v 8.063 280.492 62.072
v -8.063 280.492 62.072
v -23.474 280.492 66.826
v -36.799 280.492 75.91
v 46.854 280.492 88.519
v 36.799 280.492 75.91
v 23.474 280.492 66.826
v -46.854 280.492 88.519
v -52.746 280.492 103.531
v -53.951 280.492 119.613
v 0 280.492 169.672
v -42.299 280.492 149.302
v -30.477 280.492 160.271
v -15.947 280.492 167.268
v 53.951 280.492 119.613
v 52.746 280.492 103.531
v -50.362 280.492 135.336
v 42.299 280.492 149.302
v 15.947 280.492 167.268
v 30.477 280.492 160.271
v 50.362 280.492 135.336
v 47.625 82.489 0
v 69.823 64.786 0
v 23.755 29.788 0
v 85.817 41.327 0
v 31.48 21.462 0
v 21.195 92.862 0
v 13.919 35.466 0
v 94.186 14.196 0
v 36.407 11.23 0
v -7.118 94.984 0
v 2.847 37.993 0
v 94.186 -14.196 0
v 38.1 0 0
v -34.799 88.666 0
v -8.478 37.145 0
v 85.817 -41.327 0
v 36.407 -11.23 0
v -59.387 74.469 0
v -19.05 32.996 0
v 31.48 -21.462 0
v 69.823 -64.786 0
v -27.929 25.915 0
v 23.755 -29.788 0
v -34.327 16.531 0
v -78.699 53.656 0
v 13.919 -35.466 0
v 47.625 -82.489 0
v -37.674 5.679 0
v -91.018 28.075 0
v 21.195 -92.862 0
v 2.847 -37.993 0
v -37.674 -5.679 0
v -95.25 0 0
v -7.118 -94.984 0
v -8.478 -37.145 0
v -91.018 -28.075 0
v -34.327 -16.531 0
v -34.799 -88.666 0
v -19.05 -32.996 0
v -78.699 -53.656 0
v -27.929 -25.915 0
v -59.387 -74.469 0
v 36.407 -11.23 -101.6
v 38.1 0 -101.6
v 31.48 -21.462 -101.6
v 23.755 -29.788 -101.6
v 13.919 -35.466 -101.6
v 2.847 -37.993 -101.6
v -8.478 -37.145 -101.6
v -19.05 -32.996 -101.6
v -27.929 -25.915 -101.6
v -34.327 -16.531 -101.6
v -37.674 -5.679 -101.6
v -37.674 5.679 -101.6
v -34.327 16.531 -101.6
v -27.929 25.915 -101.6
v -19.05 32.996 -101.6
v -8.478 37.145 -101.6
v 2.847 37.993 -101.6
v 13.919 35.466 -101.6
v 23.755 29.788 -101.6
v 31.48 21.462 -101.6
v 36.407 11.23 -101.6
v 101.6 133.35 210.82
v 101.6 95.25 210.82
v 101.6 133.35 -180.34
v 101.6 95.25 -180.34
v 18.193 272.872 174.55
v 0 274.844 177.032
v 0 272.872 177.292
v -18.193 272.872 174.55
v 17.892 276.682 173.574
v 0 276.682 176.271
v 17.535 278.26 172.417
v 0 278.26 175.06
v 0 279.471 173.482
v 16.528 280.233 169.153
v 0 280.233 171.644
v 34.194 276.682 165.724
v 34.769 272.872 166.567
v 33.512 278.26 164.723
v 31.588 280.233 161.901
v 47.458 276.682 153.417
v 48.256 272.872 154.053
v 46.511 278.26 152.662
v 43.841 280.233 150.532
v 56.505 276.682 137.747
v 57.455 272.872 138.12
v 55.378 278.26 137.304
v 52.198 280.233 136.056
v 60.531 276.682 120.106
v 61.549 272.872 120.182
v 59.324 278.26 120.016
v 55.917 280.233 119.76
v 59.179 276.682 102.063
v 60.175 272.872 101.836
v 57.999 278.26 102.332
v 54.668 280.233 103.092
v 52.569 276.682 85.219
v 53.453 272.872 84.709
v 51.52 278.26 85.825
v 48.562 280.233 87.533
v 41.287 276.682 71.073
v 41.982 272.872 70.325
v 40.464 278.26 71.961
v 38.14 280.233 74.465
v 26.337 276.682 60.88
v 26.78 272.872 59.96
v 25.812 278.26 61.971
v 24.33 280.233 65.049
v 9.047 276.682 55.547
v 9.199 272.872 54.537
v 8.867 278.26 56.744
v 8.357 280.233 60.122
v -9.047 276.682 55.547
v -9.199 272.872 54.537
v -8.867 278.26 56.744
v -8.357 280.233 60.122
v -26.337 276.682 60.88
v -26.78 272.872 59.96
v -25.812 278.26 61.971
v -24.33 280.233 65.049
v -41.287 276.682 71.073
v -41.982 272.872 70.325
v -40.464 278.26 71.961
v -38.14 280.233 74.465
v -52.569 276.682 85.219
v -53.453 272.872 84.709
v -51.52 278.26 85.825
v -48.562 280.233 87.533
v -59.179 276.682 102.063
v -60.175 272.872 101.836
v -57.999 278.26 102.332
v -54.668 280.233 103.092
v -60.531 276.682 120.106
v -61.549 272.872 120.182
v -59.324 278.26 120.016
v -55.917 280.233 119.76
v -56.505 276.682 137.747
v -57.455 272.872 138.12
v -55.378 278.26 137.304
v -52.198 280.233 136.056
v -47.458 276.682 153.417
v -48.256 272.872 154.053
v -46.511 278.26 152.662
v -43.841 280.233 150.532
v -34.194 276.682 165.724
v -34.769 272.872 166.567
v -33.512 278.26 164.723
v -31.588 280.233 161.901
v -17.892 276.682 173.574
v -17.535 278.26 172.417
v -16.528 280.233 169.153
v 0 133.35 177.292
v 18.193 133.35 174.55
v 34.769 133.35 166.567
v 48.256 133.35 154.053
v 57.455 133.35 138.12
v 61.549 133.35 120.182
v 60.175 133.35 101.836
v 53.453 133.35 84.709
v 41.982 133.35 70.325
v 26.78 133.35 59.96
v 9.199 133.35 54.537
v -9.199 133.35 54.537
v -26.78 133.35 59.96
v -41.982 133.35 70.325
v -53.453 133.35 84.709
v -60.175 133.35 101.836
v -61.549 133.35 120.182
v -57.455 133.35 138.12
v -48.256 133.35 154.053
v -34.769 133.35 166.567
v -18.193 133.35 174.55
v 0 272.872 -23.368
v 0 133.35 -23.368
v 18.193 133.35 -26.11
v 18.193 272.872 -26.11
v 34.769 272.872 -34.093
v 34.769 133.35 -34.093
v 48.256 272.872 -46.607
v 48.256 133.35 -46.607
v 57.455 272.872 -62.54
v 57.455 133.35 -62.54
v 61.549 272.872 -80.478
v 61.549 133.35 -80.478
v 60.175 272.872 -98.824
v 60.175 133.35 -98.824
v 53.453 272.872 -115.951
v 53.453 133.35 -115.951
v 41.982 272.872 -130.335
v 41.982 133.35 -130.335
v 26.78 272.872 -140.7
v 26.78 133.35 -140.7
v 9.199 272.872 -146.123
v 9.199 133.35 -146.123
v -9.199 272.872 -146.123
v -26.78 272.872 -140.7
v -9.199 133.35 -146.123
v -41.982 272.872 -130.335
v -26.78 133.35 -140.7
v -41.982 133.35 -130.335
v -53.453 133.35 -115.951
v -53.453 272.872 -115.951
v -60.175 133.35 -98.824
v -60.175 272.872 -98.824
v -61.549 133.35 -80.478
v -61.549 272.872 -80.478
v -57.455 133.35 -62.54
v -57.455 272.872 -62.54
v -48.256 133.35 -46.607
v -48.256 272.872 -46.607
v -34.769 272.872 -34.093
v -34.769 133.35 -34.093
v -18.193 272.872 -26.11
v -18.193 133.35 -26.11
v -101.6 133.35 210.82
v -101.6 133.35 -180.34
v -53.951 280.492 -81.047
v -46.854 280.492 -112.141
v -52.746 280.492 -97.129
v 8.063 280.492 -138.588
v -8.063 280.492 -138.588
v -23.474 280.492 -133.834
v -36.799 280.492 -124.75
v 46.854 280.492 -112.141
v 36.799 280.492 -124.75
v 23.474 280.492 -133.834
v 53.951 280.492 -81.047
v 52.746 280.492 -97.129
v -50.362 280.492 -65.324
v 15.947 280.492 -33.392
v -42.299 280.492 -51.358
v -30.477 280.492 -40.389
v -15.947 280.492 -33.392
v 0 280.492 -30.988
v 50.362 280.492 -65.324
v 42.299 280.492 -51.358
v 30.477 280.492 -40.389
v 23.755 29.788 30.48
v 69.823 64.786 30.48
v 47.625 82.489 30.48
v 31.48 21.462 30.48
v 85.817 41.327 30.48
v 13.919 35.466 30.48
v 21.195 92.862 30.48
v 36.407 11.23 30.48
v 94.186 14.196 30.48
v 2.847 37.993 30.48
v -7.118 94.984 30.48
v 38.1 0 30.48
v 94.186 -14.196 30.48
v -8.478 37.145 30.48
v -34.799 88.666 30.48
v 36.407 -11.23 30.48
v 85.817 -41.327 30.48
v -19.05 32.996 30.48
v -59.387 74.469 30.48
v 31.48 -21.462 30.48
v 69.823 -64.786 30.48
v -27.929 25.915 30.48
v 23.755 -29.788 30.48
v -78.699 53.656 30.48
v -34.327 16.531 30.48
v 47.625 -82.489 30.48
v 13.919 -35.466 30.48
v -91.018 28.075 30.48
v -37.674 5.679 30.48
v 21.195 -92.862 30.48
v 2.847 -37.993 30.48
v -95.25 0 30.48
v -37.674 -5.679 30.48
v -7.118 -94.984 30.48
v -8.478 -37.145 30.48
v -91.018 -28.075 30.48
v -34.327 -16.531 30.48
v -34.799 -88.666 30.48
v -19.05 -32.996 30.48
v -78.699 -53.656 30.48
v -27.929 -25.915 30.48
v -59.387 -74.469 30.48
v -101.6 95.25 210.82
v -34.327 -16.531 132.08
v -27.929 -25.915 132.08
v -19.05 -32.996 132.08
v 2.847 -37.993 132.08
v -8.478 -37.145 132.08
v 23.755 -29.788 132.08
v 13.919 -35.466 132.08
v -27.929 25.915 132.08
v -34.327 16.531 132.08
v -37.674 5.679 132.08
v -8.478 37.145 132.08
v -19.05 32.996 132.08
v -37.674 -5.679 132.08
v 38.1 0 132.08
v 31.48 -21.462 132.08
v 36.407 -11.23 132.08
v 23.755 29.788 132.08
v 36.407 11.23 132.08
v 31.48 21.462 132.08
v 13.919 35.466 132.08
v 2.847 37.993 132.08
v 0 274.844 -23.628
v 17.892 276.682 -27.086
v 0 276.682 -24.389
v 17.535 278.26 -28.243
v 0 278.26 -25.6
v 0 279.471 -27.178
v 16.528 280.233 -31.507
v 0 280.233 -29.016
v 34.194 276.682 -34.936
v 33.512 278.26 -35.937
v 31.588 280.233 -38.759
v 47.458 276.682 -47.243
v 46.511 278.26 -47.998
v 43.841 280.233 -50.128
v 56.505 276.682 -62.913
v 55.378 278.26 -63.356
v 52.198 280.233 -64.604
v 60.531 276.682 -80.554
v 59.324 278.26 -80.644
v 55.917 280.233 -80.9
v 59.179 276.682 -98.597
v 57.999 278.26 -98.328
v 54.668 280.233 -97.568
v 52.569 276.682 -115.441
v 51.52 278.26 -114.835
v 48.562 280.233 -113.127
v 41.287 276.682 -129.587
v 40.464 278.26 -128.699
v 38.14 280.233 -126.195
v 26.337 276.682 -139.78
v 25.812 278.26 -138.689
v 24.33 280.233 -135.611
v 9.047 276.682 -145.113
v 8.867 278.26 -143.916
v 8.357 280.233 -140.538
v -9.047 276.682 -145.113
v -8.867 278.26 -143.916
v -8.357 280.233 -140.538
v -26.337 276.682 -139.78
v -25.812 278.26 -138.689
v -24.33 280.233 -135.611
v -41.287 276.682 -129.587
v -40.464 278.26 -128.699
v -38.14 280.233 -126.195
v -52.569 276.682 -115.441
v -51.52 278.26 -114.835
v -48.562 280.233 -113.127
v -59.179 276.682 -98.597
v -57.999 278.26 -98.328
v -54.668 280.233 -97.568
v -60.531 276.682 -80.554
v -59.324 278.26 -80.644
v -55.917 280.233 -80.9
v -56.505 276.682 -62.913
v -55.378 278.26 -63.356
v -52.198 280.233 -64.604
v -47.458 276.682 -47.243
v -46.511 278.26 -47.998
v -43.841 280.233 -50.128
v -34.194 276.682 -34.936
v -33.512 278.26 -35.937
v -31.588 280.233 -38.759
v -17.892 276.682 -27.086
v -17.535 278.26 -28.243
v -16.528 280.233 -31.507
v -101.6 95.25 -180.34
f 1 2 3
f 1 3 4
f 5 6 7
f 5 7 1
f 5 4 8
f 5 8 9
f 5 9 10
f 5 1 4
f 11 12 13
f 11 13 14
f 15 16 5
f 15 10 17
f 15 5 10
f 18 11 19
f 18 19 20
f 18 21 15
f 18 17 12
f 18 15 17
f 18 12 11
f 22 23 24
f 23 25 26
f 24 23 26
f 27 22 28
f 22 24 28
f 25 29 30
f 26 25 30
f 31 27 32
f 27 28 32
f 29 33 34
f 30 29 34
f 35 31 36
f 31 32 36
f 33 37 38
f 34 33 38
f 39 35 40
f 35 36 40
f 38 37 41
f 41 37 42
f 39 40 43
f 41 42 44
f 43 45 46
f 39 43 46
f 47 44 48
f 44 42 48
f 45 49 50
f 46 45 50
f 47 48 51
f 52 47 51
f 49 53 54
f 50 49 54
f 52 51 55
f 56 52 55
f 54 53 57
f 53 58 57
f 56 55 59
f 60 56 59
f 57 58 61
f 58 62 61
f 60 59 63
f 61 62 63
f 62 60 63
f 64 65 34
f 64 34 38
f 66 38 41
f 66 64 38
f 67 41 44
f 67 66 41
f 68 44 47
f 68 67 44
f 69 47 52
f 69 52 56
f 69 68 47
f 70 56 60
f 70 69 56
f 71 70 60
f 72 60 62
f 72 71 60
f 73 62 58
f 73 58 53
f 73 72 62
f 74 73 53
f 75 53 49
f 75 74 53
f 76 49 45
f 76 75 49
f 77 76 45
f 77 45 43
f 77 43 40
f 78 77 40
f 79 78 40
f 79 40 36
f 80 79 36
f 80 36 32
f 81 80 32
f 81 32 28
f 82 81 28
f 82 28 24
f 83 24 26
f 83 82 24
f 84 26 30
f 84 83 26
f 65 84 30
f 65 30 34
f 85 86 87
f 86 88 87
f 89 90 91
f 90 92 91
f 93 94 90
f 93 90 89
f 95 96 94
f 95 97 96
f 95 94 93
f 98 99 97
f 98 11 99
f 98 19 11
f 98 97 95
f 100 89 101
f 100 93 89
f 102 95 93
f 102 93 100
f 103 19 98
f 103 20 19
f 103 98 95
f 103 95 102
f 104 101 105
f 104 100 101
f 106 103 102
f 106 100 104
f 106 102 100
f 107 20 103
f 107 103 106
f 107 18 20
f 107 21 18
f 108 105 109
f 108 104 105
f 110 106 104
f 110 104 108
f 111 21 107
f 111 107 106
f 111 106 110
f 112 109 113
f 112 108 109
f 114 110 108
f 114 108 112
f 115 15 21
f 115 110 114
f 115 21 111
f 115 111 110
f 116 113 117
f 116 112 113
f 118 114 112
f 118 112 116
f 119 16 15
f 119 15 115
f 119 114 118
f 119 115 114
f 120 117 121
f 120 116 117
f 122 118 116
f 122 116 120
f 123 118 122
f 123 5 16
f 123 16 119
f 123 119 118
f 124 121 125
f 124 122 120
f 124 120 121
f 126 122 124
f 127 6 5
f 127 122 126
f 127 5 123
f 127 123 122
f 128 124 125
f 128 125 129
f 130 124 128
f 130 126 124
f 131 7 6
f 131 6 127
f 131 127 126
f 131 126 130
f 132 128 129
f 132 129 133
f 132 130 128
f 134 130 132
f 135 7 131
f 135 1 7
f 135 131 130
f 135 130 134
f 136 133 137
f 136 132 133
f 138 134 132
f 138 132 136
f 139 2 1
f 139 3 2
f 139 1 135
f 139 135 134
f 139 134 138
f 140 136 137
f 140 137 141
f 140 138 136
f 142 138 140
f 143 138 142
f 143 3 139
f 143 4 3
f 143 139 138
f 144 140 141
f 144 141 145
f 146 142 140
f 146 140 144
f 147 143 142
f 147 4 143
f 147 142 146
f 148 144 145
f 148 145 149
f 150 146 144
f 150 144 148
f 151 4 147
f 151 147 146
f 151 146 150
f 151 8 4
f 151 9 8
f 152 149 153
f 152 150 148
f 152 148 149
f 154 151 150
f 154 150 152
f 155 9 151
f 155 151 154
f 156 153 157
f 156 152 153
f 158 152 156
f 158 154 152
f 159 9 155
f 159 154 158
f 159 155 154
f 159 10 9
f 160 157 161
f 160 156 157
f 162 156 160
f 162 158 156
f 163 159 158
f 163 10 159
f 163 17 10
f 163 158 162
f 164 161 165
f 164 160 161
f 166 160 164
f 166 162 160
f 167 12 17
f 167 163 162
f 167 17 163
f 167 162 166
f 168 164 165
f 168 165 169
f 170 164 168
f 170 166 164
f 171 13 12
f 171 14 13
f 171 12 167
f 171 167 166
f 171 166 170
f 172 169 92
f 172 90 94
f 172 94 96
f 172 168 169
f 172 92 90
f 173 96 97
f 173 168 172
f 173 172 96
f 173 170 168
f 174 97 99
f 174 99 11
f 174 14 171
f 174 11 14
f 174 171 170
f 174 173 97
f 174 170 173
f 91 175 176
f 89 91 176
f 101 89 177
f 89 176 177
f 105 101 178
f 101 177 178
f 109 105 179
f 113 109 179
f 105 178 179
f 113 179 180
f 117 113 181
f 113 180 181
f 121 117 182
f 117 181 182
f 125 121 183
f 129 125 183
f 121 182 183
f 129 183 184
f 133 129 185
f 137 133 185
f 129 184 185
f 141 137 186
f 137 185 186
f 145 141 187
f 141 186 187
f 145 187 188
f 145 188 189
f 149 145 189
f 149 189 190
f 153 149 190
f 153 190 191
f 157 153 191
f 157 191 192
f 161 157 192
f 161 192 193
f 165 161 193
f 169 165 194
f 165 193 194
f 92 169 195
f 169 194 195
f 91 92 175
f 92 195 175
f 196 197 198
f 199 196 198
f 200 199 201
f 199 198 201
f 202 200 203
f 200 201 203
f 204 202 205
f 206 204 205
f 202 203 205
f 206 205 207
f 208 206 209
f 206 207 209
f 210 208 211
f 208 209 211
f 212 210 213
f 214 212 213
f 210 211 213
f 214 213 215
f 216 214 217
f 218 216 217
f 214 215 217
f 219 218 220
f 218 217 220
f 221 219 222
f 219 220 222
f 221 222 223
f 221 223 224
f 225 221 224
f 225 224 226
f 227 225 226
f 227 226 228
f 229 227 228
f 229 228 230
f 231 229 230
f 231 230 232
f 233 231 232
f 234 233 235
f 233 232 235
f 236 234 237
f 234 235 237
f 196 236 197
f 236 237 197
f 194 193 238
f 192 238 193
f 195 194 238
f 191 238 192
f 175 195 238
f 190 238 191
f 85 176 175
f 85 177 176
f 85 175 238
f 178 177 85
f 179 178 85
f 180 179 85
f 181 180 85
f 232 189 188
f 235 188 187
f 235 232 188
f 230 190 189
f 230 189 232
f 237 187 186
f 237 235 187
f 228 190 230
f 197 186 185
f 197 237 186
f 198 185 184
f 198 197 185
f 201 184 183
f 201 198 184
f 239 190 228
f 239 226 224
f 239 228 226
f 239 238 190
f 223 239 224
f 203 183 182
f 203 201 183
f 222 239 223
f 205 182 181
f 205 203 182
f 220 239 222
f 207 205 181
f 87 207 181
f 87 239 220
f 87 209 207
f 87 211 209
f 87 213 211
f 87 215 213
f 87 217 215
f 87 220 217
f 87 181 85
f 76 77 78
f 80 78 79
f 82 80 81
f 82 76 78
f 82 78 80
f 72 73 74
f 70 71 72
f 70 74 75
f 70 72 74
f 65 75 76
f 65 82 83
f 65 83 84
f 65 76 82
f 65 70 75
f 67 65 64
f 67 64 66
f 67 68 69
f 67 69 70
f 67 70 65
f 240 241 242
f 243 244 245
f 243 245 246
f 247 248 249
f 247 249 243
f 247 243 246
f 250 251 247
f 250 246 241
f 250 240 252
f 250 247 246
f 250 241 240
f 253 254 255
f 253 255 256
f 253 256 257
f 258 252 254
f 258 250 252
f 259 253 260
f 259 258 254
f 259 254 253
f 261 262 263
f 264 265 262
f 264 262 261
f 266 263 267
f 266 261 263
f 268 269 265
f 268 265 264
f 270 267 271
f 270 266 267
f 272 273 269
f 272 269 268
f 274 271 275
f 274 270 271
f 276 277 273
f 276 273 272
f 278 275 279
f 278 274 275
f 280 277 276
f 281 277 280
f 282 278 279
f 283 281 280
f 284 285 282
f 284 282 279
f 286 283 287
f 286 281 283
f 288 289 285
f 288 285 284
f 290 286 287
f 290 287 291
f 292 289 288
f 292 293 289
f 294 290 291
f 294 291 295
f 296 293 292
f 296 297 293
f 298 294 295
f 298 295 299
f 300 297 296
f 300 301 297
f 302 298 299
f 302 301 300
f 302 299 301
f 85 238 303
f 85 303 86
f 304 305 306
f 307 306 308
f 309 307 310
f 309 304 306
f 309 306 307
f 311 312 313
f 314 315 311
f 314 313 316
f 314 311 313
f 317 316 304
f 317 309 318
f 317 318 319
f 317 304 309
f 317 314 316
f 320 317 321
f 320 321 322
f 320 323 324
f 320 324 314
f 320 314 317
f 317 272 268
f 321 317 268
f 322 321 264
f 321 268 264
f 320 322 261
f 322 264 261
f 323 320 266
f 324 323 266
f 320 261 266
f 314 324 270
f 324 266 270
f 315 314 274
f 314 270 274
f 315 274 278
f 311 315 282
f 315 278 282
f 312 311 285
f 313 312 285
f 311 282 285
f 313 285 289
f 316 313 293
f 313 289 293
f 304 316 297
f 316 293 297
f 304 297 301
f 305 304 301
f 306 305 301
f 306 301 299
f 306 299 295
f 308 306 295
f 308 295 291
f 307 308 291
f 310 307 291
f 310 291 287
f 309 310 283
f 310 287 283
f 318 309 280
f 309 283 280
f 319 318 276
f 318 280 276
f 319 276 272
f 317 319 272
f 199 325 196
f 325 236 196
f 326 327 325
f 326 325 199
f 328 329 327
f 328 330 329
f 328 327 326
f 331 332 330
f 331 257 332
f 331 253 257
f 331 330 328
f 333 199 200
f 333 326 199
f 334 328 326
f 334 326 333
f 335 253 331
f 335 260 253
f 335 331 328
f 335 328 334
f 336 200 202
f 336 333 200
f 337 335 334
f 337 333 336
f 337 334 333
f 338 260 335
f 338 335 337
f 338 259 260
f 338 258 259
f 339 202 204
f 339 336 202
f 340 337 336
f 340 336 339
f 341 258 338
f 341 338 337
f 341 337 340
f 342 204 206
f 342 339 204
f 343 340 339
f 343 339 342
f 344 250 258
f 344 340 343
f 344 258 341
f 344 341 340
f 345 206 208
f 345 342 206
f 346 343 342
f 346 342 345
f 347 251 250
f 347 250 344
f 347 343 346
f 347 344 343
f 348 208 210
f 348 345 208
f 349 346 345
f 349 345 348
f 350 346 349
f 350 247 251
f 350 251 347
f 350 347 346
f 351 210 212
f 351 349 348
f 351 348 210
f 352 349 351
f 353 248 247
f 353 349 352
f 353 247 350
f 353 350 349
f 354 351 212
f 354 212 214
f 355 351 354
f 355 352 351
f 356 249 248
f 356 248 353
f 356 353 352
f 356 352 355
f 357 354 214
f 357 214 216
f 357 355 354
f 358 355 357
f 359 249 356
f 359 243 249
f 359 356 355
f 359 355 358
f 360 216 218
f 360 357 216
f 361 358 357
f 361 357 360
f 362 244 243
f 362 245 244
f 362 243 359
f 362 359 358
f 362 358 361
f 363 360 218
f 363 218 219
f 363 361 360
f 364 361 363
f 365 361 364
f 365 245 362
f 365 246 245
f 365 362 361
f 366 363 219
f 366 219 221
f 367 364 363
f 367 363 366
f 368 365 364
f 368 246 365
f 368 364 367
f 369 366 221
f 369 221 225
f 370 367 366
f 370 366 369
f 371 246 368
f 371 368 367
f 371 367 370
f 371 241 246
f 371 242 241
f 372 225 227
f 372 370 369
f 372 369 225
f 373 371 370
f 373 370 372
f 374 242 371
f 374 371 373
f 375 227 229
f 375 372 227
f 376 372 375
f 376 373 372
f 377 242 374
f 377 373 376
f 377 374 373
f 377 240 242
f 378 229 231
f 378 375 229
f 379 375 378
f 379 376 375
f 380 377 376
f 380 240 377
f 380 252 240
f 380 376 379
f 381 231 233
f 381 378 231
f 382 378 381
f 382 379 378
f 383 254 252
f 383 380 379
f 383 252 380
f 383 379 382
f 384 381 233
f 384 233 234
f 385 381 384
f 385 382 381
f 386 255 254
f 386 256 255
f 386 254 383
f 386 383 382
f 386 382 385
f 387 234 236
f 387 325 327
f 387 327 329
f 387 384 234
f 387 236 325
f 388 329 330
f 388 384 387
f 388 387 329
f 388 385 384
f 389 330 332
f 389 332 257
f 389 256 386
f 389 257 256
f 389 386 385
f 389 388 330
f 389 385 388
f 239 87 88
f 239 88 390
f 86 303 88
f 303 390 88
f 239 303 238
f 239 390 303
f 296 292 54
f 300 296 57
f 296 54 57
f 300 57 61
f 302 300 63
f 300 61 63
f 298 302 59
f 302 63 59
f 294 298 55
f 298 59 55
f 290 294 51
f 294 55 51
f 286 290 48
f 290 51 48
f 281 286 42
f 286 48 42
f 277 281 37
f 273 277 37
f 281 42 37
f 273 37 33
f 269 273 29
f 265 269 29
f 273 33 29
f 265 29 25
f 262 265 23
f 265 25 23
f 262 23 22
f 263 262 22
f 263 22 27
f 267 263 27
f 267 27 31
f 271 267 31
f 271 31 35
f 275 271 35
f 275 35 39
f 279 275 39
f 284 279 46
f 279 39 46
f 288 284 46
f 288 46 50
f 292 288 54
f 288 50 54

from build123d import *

# Parameters (mm, degrees)
SKETCH1_R             = 95.25
BOSS_EXTRUDE1_DEPTH   = 30.48
SKETCH1_W             = 203.2
SKETCH1_H             = 38.1
BOSS_EXTRUDE1_2_DEPTH = 30.48
SKETCH4_W             = 203.2
SKETCH4_H             = 38.1
BOSS_EXTRUDE2_DEPTH   = 180.34
SKETCH5_W             = 203.2
SKETCH5_H             = 38.1
BOSS_EXTRUDE3_DEPTH   = 180.34
SKETCH6_R             = 38.1
BOSS_EXTRUDE4_DEPTH   = 101.6
BOSS_EXTRUDE5_START   = 101.6
SKETCH7_R             = 38.1
BOSS_EXTRUDE5_DEPTH   = 101.6
SKETCH8_R             = 61.722
BOSS_EXTRUDE6_DEPTH   = 147.1422
FILLET1_R             = 7.62


with BuildPart() as part:
    # Sketch1 → Boss-Extrude1 (new body)
    with BuildSketch(Plane.XY):
        with Locations(Location((0, 0, 0), (0, 0, 180))):
            Circle(SKETCH1_R)
    extrude(amount=BOSS_EXTRUDE1_DEPTH)

    # Sketch6 → Boss-Extrude4 (add)
    with BuildSketch(Plane.XY.offset(30.48)):
        Circle(SKETCH6_R)
    extrude(amount=BOSS_EXTRUDE4_DEPTH)

    # Sketch7 → Boss-Extrude5 (add)
    with BuildSketch(Plane(origin=(0, 0, 0), x_dir=(-1, 0, 0), z_dir=(0, 0, -1)).offset(BOSS_EXTRUDE5_START)):
        with Locations(Location((0, 0, 0), (0, 0, 180))):
            Circle(SKETCH7_R)
    extrude(amount=-BOSS_EXTRUDE5_DEPTH)


with BuildPart() as body_2:
    # Sketch1 → Boss-Extrude1 2 (new body)
    with BuildSketch(Plane.XY):
        with Locations((0, 114.3)):
            Rectangle(SKETCH1_W, SKETCH1_H)
    extrude(amount=BOSS_EXTRUDE1_2_DEPTH)

    # Sketch4 → Boss-Extrude2 (add)
    with BuildSketch(Plane(origin=(0, 0, 0), x_dir=(-1, 0, 0), z_dir=(0, 0, -1))):
        with Locations((0, 114.3)):
            Rectangle(SKETCH4_W, SKETCH4_H)
    extrude(amount=BOSS_EXTRUDE2_DEPTH)

    # Sketch5 → Boss-Extrude3 (add)
    with BuildSketch(Plane.XY.offset(30.48)):
        with Locations((0, 114.3)):
            Rectangle(SKETCH5_W, SKETCH5_H)
    extrude(amount=BOSS_EXTRUDE3_DEPTH)

    # Sketch8 → Boss-Extrude6 (add)
    with BuildSketch(Plane(origin=(0, 133.35, 0), x_dir=(1, 0, 0), z_dir=(0, 1, 0))):
        with Locations(Location((0, -115.57, 0), (0, 0, 270))):
            Circle(SKETCH8_R)
        with Locations(Location((0, 85.09, 0), (0, 0, 270))):
            Circle(SKETCH8_R)
    extrude(amount=BOSS_EXTRUDE6_DEPTH)

    # Fillet1
    fillet1_edges = [body_2.edges().sort_by_distance(p)[0] for p in [
        (0, 280.4922, 53.848),
        (0, 280.4922, -146.812),
    ]]
    fillet(fillet1_edges, radius=FILLET1_R)


solid = Compound([part.part, body_2.part])
